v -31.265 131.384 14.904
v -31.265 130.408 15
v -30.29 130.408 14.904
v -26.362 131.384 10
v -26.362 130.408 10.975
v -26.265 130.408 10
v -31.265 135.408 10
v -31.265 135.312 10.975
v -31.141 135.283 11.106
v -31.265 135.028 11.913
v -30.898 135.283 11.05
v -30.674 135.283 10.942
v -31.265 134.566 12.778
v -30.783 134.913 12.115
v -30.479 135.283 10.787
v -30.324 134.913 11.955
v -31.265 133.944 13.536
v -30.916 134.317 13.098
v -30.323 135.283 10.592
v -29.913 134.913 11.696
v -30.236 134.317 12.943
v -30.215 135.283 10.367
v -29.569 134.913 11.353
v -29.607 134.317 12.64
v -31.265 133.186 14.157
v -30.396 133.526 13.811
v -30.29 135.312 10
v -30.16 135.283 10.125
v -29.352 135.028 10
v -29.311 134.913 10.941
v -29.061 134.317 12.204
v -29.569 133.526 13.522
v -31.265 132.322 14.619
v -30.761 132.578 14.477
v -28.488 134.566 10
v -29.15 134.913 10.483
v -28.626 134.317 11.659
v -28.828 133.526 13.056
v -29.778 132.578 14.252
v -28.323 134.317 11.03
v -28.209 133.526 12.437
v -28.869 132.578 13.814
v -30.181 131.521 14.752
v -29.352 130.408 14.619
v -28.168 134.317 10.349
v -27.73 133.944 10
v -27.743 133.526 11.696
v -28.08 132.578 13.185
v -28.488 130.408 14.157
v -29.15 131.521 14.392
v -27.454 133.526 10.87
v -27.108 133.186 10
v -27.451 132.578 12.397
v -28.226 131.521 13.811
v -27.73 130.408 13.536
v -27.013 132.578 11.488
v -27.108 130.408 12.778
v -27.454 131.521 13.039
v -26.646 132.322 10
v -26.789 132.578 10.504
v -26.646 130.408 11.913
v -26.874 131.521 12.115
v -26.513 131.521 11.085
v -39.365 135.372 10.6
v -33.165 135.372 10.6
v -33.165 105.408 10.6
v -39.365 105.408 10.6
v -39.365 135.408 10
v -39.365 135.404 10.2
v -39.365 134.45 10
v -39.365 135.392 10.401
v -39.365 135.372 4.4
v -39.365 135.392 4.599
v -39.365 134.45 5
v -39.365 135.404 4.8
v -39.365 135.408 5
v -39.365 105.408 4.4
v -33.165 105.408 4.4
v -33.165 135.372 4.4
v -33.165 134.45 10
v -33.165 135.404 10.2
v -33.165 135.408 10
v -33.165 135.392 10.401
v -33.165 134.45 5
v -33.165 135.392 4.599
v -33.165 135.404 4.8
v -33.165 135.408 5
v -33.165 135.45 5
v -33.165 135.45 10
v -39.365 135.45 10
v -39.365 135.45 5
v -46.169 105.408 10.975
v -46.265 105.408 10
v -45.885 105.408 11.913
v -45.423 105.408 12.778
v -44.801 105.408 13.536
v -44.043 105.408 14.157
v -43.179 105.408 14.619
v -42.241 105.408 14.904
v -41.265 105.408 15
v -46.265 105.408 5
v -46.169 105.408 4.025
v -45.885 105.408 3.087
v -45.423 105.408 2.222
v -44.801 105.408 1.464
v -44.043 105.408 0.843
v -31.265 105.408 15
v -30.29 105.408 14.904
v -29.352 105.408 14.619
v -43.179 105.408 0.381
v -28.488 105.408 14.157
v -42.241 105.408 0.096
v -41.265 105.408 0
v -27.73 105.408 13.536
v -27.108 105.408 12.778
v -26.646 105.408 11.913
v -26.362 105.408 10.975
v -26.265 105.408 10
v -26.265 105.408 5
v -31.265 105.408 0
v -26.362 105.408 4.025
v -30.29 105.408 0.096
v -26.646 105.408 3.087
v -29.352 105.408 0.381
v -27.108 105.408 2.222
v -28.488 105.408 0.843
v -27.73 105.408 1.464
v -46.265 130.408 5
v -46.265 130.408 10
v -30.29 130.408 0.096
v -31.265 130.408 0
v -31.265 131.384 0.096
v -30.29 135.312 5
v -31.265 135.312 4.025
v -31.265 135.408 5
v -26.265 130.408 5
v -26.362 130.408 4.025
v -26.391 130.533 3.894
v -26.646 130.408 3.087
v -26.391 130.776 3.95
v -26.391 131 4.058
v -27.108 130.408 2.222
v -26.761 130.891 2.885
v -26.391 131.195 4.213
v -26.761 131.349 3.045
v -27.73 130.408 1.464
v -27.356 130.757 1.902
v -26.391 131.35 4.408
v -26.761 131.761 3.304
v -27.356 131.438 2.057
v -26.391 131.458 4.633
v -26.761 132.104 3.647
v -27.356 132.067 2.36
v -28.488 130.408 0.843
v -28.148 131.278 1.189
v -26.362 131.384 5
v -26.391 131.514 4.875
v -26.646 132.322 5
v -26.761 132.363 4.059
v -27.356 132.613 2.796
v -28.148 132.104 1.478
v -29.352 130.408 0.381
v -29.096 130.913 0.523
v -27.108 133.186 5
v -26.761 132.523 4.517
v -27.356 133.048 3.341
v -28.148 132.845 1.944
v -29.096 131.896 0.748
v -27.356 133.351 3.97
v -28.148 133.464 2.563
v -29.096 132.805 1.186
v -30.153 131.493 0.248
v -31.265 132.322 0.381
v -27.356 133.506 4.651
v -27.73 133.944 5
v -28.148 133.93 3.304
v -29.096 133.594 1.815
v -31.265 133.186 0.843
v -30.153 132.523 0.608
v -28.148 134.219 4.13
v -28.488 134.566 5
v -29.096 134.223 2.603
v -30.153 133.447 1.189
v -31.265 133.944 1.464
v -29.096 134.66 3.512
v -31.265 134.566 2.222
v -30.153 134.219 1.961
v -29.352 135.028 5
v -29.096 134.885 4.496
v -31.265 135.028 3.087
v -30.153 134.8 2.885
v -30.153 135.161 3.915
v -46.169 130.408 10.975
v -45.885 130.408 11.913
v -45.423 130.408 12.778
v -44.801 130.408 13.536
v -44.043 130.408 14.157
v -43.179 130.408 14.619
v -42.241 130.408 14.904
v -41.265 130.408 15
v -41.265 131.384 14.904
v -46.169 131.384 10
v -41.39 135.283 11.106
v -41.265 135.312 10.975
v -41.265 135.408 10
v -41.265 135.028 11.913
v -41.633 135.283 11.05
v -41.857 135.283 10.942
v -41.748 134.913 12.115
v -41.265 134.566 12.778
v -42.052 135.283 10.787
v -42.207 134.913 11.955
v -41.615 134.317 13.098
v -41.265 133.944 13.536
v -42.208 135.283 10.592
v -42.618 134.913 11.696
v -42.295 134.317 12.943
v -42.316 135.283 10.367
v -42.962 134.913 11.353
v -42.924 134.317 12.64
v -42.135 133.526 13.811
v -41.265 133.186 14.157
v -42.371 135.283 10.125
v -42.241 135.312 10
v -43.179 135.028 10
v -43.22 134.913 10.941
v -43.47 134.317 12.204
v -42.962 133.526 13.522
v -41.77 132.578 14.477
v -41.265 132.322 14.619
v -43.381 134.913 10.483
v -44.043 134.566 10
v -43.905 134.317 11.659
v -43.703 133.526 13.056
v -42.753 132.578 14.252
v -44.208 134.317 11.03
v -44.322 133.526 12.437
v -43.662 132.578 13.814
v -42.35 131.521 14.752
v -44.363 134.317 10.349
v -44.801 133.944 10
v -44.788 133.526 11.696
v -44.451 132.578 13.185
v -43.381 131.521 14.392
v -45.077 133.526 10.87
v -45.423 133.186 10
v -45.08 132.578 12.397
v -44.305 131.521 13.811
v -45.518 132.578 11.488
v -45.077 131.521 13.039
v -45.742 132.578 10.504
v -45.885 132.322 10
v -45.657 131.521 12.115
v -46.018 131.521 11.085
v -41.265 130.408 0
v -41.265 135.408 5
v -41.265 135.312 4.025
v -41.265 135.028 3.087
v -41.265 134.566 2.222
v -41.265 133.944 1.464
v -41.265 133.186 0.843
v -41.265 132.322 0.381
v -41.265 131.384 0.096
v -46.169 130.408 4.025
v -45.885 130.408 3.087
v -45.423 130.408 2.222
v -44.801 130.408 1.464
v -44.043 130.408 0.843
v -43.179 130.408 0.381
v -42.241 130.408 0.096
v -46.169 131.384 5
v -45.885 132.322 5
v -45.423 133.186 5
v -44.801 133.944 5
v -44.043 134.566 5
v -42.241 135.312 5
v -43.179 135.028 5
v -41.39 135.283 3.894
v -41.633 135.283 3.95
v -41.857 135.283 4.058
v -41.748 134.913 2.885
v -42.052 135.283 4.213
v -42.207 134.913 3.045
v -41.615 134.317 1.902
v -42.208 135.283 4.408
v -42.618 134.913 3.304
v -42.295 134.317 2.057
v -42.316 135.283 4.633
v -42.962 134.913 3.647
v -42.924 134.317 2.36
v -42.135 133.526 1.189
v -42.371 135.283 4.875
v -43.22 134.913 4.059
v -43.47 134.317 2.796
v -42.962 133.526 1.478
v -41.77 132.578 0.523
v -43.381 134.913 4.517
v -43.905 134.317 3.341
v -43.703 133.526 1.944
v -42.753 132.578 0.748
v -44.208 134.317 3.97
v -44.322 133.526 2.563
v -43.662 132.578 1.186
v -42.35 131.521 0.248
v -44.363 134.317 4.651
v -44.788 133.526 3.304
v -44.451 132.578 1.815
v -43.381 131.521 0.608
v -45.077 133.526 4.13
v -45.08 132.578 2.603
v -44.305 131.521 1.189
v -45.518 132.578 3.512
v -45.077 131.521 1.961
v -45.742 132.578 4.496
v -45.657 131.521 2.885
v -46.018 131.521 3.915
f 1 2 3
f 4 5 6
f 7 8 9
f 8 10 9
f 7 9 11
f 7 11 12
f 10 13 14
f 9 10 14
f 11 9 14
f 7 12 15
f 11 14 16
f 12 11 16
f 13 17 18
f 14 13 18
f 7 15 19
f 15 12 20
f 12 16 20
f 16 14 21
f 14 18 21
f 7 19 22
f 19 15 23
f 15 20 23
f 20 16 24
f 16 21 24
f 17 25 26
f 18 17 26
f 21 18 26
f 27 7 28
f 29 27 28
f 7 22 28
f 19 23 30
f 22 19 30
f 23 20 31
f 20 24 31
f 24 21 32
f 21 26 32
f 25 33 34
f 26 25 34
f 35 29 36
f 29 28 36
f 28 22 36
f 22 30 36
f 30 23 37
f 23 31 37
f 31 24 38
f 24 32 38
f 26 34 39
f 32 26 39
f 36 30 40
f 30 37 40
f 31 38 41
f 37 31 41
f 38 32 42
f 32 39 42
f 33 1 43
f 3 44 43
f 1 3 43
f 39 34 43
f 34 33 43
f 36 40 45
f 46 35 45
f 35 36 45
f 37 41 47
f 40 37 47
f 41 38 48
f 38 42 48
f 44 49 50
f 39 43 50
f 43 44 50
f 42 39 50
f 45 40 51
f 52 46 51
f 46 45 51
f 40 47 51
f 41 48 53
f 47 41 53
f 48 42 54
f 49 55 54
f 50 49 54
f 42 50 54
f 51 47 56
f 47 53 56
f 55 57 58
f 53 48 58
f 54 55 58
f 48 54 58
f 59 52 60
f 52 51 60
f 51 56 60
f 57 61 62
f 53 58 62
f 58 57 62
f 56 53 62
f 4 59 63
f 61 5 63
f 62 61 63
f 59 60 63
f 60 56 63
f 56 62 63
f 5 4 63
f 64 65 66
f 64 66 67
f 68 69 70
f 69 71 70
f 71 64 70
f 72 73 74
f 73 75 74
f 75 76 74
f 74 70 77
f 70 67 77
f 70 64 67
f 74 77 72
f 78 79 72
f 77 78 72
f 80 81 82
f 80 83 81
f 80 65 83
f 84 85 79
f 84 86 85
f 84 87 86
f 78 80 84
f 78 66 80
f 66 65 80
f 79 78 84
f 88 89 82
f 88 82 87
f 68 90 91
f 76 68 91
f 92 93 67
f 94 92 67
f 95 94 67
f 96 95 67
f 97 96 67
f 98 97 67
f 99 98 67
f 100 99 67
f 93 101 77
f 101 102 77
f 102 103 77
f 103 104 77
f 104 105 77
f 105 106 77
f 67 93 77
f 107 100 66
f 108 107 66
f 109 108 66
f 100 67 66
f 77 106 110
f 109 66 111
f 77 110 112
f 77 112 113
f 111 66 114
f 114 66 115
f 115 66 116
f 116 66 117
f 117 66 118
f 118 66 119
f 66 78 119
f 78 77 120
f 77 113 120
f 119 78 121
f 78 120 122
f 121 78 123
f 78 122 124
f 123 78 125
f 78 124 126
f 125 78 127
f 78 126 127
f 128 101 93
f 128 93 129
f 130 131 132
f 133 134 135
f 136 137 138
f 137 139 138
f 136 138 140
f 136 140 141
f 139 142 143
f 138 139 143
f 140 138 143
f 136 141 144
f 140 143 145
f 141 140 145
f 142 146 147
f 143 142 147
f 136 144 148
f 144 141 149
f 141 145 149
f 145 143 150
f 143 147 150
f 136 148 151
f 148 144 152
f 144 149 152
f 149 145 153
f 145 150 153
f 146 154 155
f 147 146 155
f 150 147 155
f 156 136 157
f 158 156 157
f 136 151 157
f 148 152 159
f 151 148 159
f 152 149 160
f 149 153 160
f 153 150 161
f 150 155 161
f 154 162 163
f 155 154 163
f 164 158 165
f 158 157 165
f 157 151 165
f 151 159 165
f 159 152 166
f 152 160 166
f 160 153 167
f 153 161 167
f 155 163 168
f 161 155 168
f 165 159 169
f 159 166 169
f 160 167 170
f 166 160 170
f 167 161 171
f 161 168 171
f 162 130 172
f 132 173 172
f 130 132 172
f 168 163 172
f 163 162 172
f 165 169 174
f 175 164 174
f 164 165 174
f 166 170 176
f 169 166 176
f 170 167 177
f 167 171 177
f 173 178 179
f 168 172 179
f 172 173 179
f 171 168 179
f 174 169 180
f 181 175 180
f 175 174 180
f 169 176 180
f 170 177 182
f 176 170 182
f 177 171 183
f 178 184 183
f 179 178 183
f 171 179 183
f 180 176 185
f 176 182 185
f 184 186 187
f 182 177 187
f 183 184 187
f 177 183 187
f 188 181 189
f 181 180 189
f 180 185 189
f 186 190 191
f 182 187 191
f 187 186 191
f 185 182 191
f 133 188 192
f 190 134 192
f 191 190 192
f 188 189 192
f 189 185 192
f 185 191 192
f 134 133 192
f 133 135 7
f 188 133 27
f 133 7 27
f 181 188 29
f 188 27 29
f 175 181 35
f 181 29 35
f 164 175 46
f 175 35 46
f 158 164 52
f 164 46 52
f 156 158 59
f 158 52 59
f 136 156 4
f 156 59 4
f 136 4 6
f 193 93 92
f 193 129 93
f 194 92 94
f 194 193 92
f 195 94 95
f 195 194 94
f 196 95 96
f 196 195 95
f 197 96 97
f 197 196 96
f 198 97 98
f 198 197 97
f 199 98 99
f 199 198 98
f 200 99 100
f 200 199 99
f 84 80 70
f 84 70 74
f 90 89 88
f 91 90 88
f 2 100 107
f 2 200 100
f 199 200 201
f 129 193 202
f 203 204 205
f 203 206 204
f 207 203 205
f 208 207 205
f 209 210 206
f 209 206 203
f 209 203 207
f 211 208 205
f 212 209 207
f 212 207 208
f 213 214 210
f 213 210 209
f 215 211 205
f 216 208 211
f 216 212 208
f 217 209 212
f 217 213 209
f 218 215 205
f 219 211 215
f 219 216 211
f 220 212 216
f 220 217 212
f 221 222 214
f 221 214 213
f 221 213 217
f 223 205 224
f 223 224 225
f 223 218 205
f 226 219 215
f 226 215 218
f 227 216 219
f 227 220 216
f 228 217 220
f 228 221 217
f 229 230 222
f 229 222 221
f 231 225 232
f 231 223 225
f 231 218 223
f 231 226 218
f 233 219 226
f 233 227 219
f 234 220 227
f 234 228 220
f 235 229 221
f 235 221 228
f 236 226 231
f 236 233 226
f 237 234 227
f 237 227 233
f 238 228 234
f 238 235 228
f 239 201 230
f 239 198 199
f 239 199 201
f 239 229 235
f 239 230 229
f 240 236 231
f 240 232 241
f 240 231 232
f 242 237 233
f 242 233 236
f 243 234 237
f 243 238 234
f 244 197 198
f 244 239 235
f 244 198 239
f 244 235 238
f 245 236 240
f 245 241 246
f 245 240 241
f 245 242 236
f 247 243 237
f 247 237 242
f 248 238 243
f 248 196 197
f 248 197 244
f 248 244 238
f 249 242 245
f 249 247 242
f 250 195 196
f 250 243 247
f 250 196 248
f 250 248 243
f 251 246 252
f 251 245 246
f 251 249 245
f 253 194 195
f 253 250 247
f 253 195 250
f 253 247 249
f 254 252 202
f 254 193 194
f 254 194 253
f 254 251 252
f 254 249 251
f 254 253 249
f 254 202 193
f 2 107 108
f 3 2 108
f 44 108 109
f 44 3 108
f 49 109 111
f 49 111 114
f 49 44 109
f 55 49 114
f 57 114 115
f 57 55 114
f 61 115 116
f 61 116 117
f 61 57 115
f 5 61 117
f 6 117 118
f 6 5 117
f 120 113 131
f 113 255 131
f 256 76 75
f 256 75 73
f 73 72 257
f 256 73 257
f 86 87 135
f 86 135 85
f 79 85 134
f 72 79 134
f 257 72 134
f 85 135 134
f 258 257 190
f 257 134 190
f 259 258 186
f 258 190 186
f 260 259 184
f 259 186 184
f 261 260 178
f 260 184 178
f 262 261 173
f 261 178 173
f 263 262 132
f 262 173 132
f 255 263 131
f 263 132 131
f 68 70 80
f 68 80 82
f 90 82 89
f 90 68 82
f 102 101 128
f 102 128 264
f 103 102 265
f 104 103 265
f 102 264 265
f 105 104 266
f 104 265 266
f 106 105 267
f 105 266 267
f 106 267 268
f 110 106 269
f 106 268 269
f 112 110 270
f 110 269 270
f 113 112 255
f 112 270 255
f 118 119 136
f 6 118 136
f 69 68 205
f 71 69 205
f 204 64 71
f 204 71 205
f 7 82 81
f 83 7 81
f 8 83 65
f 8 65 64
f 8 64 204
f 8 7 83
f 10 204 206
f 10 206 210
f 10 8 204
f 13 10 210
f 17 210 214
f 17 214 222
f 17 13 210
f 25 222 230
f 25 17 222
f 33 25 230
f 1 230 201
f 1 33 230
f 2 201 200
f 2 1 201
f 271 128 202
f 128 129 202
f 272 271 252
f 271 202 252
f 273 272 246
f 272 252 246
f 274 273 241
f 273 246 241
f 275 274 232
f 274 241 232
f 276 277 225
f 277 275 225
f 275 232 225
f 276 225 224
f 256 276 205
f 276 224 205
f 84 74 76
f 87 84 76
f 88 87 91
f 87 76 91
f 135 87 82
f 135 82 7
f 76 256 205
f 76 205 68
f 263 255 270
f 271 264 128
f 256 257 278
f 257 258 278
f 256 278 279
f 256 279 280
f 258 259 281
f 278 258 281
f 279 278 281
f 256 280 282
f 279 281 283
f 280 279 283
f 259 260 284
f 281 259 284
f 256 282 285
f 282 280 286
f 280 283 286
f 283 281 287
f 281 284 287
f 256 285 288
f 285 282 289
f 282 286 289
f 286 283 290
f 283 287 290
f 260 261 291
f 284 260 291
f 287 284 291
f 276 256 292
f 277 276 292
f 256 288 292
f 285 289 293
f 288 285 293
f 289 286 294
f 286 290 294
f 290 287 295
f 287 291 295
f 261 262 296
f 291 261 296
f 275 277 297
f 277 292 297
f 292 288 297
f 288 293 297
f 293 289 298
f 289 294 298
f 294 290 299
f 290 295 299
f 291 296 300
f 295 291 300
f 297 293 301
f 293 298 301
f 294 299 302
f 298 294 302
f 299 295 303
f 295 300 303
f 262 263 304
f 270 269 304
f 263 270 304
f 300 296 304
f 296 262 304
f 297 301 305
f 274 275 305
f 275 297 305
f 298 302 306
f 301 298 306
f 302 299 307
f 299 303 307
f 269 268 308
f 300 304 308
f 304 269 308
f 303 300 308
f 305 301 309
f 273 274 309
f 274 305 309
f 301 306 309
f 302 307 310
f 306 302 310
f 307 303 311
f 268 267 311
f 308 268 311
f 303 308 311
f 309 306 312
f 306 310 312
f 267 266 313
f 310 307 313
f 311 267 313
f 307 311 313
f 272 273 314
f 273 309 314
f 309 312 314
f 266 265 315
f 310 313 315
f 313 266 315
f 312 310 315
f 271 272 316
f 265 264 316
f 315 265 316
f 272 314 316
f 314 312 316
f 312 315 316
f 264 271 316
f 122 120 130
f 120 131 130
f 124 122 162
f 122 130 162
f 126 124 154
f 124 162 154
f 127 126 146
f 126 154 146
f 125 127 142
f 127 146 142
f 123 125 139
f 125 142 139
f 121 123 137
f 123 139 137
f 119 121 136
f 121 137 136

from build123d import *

# Parameters (mm, degrees)
SKETCH1_W           = 20
SKETCH1_H           = 30
BOSS_EXTRUDE1_DEPTH = 15
SKETCH2_W           = 6.2
SKETCH2_H           = 6.2
CUT_EXTRUDE1_DEPTH  = 3.25
FILLET1_R           = 5
SKETCH4_W           = 6.2
SKETCH4_H           = 6.2
CUT_EXTRUDE2_DEPTH  = 68
SKETCH6_W           = 5
SKETCH6_H           = 1
BOSS_EXTRUDE3_DEPTH = 6.2


with BuildPart() as part:
    # Sketch1 → Boss-Extrude1 (new body)
    with BuildSketch(Plane.XY):
        with Locations((-36.265495527, 120.408164147)):
            Rectangle(SKETCH1_W, SKETCH1_H)
    extrude(amount=BOSS_EXTRUDE1_DEPTH)

    # Sketch2 → Cut-Extrude1 (cut)
    with BuildSketch(Plane(origin=(0, 105.408164147, 0), x_dir=(-1, 0, 0), z_dir=(0, -1, 0))):
        with Locations((36.265495527, -7.5)):
            Rectangle(SKETCH2_W, SKETCH2_H)
    extrude(amount=-CUT_EXTRUDE1_DEPTH, mode=Mode.SUBTRACT)

    # Fillet1
    fillet1_edges = [part.edges().sort_by_distance(p)[0] for p in [
        (-46.265495527, 120.408164147, 15),
        (-26.265495527, 120.408164147, 15),
        (-46.265495527, 120.408164147, 0),
        (-36.265495527, 135.408164147, 0),
        (-26.265495527, 120.408164147, 0),
        (-36.265495527, 135.408164147, 15),
        (-46.265495527, 135.408164147, 7.5),
        (-26.265495527, 135.408164147, 7.5),
    ]]
    fillet(fillet1_edges, radius=FILLET1_R)

    # Sketch4 → Cut-Extrude2 (cut)
    with BuildSketch(Plane.XZ.offset(-108.658164147)):
        with Locations((-36.265495527, 7.5)):
            Rectangle(SKETCH4_W, SKETCH4_H)
    extrude(amount=-CUT_EXTRUDE2_DEPTH, mode=Mode.SUBTRACT)

    # Sketch6 → Boss-Extrude3 (add)
    with BuildSketch(Plane(origin=(-39.365495527, 0, 0), x_dir=(0, 0, -1), z_dir=(1, 0, 0))):
        with Locations((-7.5, 134.949726458)):
            Rectangle(SKETCH6_W, SKETCH6_H)
    extrude(amount=BOSS_EXTRUDE3_DEPTH)


solid = part.part
